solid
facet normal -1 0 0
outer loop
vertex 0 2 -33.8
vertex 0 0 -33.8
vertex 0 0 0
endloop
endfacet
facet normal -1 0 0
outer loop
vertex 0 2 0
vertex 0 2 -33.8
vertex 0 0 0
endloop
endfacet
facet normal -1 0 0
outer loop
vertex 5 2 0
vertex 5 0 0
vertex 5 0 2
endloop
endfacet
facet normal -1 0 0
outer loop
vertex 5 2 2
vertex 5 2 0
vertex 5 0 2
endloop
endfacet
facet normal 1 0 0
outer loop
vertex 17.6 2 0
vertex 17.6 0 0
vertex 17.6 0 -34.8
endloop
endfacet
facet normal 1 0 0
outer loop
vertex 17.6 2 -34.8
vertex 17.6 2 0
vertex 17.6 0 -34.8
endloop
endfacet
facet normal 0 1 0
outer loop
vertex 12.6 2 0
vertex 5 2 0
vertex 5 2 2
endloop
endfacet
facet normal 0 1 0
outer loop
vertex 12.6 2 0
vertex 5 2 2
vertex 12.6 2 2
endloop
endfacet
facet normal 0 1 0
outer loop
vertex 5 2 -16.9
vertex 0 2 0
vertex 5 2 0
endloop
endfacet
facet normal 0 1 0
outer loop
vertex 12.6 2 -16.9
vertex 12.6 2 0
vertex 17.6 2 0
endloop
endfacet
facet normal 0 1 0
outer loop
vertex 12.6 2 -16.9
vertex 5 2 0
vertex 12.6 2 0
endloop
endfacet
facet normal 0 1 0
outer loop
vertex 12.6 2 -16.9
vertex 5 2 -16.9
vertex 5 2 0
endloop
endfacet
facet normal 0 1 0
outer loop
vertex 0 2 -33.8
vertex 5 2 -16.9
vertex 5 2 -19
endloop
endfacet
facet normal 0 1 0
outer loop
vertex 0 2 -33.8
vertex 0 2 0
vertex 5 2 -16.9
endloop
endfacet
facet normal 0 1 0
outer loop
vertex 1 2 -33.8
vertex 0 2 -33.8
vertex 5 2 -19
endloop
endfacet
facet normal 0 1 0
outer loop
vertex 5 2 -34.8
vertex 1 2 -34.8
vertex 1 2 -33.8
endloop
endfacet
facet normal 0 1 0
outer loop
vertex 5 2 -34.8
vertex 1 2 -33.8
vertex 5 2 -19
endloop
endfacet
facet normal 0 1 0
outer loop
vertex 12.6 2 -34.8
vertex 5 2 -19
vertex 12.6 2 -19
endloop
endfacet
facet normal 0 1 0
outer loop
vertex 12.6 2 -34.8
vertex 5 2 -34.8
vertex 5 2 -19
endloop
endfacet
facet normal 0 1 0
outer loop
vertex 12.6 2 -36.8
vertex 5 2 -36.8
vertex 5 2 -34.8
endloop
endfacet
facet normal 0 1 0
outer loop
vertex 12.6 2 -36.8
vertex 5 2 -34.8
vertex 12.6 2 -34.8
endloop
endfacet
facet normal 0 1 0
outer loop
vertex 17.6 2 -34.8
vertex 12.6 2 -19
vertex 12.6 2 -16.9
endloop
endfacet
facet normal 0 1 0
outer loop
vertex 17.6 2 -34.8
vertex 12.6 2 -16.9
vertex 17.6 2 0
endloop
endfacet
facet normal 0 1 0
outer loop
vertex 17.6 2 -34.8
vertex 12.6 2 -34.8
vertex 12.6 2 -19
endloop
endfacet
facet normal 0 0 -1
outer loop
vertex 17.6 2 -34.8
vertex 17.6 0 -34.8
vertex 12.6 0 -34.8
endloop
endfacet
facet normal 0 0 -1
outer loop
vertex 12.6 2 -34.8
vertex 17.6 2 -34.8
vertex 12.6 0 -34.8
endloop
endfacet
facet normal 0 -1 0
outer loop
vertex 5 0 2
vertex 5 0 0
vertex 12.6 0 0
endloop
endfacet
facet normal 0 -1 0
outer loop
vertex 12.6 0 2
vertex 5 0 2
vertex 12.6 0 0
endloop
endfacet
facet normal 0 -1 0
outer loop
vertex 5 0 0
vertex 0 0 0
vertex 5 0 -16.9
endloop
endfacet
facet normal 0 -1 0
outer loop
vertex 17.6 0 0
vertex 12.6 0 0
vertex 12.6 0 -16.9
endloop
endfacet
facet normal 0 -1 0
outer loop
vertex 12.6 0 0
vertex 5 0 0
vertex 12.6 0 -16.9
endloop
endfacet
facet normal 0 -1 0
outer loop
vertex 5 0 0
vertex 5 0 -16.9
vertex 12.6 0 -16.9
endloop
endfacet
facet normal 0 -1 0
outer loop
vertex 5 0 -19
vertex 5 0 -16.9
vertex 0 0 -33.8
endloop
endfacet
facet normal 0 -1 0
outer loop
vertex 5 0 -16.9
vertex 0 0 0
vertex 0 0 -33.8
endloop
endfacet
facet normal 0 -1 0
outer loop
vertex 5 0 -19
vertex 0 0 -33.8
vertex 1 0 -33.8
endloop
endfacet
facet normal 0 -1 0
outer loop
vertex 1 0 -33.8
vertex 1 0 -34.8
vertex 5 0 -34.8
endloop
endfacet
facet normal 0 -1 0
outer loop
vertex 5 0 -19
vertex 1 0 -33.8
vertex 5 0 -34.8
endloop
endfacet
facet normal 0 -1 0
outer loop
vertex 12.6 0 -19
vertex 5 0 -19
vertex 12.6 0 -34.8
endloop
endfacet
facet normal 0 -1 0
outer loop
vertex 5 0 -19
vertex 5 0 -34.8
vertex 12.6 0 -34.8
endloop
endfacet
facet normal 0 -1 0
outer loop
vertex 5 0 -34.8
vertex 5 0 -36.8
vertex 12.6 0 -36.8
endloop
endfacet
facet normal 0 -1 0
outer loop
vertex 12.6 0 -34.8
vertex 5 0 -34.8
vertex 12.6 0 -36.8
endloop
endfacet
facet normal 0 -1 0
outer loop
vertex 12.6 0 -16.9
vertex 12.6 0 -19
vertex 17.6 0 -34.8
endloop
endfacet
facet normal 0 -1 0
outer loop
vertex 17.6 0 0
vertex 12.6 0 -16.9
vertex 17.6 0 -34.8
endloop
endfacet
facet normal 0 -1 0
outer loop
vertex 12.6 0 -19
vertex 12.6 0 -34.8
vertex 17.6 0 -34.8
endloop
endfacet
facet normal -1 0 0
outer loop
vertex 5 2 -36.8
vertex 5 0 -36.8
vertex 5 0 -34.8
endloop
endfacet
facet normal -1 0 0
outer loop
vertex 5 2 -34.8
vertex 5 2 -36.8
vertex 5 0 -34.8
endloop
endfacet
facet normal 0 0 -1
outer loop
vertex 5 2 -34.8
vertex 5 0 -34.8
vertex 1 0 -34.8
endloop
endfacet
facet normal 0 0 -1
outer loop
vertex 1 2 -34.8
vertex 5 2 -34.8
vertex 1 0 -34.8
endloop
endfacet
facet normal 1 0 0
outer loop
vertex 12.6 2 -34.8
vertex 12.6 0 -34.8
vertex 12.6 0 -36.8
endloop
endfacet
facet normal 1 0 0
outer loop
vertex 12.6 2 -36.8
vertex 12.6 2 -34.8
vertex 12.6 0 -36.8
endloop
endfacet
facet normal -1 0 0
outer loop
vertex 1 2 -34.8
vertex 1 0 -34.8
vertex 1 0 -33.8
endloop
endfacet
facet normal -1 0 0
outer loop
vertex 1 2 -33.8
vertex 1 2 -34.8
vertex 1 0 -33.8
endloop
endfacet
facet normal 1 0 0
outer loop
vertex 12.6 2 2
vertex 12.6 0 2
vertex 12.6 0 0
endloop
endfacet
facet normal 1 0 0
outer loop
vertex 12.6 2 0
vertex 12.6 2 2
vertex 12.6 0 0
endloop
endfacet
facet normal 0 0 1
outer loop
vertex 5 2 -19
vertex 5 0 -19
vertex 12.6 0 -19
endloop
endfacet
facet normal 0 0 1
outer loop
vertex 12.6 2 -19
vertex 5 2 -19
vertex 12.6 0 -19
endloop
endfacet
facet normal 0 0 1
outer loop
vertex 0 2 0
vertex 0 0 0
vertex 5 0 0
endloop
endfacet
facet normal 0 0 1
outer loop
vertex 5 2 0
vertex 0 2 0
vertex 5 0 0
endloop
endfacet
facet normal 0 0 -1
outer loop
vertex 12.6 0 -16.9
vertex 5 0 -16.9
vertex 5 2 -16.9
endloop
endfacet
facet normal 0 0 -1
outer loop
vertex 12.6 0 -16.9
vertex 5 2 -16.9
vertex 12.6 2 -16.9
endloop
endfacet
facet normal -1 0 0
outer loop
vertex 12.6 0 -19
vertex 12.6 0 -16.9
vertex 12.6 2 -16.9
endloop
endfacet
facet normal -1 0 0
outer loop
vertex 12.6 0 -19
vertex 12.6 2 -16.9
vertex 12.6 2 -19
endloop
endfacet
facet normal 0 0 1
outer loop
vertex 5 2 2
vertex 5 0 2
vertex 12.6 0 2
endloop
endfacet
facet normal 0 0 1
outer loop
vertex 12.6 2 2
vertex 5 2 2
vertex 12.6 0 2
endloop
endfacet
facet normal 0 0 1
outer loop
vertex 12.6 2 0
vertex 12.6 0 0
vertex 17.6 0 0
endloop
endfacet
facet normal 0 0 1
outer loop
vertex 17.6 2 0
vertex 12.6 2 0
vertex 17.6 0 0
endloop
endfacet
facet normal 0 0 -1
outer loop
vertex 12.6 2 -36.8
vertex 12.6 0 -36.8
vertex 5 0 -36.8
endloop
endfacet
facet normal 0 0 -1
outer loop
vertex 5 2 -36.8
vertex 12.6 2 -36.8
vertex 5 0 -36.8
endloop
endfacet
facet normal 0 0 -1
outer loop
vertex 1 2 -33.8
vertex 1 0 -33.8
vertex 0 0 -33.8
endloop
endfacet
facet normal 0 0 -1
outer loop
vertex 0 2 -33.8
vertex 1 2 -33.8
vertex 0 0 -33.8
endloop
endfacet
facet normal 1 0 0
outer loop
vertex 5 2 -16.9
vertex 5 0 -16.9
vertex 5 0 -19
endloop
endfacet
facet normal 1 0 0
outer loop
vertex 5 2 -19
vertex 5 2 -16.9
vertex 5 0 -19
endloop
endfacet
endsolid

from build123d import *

# Parameters (mm, degrees)
SKETCH_1_W      = 7.6
SKETCH_1_H      = 2.1
EXTRUDE_1_DEPTH = 2


with BuildPart() as part:
    # 草图1 → 凸台-拉伸1 (new body)
    with BuildSketch(Plane(origin=(0, 0, 0), x_dir=(1, 0, 0), z_dir=(0, 1, 0))):
        Polygon((0, 33.8), (0, 0), (5, 0), (5, -2), (12.6, -2), (12.6, 0), (17.6, 0), (17.6, 34.8), (12.6, 34.8), (12.6, 36.8), (5, 36.8), (5, 34.8), (1, 34.8), (1, 33.8), align=None)
        with Locations((8.8, 17.95)):
            Rectangle(SKETCH_1_W, SKETCH_1_H, mode=Mode.SUBTRACT)
    extrude(amount=EXTRUDE_1_DEPTH)


solid = part.part
